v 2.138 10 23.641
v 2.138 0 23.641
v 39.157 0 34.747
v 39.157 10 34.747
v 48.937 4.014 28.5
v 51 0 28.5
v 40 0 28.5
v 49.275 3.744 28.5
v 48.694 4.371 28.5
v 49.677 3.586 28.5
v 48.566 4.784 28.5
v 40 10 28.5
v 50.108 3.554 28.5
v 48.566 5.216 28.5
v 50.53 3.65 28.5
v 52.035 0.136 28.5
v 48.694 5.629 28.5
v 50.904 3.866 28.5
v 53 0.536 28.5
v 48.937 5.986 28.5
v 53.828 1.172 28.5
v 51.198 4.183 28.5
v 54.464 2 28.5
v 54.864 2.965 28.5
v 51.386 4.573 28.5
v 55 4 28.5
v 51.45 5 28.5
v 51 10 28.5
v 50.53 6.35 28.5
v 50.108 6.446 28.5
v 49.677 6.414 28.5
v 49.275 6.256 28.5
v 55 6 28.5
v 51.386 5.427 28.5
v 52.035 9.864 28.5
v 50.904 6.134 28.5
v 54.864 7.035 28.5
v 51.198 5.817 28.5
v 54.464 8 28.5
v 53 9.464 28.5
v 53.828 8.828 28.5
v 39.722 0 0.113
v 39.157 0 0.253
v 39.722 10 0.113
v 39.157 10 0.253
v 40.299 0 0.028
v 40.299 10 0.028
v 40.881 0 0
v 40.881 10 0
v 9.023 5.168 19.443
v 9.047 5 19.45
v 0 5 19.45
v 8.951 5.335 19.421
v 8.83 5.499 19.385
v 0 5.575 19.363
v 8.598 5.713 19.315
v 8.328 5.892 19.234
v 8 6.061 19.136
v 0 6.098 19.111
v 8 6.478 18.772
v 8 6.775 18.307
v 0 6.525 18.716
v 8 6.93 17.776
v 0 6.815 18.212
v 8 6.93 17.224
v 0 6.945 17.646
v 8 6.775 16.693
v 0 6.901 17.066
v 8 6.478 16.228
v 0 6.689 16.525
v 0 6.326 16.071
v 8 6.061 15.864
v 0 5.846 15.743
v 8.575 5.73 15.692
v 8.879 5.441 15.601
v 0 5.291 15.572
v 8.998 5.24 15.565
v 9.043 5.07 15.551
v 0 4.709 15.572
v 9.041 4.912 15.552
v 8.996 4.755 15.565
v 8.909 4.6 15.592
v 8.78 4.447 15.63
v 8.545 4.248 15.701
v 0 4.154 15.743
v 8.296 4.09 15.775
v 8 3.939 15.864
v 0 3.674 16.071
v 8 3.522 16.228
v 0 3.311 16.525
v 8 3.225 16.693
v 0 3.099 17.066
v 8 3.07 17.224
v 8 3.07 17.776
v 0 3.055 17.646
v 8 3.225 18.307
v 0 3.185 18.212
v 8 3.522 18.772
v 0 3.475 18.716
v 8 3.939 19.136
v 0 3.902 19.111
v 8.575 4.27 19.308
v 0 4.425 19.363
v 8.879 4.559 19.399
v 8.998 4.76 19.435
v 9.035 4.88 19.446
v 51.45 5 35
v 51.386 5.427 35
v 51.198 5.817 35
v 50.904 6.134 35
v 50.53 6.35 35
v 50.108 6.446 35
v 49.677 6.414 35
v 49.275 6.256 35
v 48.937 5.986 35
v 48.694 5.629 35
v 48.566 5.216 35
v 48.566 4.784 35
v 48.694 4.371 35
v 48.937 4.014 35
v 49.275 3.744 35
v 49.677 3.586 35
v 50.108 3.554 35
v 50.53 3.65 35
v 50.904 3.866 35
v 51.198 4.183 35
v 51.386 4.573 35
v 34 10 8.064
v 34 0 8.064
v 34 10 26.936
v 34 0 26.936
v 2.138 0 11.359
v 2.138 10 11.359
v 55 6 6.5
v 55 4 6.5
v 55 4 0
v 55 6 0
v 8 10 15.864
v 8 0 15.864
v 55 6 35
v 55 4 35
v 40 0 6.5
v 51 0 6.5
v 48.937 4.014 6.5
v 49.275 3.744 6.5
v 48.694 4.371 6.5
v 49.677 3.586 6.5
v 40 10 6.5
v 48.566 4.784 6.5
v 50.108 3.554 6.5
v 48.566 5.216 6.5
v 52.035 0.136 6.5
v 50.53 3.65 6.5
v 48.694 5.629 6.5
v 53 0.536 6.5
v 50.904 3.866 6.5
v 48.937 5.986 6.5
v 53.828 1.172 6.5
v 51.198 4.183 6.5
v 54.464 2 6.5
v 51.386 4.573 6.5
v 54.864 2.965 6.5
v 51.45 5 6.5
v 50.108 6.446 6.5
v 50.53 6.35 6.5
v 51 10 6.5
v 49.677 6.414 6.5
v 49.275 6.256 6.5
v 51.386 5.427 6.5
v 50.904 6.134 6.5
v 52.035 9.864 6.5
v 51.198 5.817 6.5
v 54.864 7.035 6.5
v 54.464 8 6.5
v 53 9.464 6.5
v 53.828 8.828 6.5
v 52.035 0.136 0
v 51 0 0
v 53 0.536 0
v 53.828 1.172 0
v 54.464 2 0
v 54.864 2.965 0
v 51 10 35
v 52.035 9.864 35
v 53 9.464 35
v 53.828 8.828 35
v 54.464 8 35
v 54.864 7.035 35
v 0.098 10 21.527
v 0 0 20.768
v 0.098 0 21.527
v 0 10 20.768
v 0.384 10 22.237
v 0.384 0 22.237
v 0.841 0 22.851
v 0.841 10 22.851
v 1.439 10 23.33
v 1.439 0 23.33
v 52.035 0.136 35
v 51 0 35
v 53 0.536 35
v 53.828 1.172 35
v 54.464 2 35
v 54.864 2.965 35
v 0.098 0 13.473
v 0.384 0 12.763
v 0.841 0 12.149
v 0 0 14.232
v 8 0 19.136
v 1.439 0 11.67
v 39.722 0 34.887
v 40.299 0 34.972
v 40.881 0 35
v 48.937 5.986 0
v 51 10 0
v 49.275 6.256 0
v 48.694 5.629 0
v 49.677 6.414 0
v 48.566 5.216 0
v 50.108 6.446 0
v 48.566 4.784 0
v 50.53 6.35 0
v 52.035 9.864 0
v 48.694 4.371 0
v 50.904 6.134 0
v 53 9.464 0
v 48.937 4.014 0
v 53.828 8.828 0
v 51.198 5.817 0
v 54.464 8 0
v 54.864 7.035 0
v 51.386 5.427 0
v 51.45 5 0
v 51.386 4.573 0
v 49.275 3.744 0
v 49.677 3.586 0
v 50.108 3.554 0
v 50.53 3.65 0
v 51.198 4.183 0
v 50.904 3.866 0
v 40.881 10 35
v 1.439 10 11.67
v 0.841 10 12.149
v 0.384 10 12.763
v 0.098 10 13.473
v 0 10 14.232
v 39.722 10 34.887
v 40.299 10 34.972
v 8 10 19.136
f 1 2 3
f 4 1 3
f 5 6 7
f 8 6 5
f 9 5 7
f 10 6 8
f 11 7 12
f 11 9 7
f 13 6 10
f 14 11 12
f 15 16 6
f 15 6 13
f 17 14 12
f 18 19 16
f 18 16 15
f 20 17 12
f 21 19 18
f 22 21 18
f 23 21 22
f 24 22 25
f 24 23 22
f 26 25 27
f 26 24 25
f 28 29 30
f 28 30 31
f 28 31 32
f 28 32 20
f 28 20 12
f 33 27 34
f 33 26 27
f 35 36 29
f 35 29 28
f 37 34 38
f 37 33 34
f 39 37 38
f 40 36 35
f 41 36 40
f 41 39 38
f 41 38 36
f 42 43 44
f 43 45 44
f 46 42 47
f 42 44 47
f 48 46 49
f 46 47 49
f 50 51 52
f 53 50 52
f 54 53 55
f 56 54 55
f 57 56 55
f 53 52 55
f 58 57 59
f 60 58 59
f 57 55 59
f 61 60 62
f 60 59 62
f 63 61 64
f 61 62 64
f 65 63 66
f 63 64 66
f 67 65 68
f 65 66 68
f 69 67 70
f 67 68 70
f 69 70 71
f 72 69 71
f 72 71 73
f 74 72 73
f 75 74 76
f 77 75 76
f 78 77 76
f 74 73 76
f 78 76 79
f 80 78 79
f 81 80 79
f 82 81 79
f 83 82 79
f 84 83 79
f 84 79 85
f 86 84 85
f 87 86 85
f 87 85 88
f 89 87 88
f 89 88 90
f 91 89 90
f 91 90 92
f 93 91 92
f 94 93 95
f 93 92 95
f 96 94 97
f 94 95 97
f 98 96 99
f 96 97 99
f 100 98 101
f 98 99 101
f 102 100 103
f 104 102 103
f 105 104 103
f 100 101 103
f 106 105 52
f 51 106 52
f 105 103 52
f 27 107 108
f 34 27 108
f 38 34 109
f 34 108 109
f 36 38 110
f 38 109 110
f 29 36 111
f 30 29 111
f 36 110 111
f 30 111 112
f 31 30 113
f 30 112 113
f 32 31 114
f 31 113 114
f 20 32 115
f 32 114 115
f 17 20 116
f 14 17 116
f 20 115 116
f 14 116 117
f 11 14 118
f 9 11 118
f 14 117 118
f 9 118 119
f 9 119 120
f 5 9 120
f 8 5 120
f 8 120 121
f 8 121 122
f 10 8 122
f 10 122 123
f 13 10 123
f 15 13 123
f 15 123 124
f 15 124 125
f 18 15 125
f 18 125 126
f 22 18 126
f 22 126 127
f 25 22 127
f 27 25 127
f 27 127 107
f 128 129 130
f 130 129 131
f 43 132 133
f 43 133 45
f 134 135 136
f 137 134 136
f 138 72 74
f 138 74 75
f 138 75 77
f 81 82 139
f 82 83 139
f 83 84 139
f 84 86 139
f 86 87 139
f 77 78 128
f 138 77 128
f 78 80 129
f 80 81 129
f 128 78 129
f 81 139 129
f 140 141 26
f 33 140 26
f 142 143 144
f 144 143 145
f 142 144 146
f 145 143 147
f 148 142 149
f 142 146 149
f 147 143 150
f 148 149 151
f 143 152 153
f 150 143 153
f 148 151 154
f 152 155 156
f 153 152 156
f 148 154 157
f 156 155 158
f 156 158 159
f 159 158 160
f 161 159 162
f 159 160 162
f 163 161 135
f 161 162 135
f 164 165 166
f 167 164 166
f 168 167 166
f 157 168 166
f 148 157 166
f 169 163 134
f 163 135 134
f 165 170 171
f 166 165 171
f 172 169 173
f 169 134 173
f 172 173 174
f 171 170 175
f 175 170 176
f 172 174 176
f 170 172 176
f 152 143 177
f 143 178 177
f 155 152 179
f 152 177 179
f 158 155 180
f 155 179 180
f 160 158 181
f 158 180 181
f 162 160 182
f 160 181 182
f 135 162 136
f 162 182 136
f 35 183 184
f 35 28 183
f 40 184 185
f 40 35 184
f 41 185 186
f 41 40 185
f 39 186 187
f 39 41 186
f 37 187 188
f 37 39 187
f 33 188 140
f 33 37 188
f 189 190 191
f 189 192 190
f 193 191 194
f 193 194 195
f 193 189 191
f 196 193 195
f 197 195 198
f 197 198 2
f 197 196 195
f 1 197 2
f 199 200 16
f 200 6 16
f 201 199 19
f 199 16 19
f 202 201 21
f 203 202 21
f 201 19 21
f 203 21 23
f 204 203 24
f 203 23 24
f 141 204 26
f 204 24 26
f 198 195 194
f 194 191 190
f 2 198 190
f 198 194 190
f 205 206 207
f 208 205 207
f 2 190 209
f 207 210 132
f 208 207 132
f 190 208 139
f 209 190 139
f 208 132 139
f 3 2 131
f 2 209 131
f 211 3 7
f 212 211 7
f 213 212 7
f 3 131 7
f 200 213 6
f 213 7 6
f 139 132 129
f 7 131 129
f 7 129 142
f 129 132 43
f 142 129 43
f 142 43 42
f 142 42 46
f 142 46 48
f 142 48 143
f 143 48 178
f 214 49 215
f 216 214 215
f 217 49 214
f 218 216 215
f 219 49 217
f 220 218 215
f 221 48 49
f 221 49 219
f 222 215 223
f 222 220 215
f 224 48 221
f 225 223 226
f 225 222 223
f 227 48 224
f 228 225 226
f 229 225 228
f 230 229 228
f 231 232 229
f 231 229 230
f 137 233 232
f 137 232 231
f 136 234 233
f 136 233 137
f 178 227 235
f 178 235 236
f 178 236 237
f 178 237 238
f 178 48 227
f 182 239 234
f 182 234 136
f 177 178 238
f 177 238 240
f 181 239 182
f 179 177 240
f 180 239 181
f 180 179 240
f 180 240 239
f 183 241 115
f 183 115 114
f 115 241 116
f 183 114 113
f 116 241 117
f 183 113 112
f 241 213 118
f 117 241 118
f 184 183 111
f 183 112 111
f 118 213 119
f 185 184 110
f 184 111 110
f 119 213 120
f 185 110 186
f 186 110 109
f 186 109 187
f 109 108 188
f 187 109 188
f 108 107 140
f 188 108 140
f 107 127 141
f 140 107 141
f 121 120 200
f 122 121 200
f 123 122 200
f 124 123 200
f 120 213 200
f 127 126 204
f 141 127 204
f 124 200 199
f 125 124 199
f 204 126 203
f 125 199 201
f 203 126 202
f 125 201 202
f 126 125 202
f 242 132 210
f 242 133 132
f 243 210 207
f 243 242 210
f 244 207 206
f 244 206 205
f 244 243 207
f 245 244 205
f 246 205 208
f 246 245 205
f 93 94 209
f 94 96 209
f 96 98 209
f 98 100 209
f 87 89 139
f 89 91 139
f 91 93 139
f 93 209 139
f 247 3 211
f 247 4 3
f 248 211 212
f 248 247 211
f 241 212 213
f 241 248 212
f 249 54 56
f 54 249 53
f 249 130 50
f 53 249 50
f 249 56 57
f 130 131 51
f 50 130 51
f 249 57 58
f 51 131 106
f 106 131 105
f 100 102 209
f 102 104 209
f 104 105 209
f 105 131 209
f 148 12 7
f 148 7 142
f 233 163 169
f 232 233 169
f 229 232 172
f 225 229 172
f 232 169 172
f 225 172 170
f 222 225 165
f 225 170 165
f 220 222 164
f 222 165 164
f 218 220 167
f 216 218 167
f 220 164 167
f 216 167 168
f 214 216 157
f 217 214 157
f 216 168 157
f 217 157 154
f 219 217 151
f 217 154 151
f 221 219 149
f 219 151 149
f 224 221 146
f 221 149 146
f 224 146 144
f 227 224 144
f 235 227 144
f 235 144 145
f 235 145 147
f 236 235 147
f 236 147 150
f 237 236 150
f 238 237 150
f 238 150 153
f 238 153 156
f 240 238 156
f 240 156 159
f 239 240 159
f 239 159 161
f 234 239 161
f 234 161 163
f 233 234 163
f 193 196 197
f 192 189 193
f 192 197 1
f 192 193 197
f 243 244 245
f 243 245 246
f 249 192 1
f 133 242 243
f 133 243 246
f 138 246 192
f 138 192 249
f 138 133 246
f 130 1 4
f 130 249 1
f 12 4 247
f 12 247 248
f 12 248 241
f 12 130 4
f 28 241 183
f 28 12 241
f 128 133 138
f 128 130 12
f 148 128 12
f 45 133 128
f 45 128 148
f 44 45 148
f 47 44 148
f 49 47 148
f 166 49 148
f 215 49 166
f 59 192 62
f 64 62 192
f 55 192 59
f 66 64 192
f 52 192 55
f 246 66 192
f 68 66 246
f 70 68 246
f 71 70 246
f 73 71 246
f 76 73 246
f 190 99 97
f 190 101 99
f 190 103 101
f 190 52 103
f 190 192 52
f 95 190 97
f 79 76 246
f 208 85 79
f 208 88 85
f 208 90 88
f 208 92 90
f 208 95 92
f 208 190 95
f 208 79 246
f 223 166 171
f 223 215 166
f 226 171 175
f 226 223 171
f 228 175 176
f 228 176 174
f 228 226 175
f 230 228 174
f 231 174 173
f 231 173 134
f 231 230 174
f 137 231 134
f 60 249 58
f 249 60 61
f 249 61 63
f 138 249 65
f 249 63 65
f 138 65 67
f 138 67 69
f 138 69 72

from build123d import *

# Parameters (mm, degrees)
SKETCH1_W           = 55
SKETCH1_H           = 35
BOSS_EXTRUDE1_DEPTH = 10
CUT_EXTRUDE6_DEPTH  = 66.954529791
SKETCH12_R          = 1.45
CUT_EXTRUDE8_DEPTH  = 66.954529791
SKETCH13_R          = 1.95
CUT_EXTRUDE9_DEPTH  = 11
SKETCH2_W           = 22
SKETCH2_H           = 10
CUT_EXTRUDE10_DEPTH = 15
FILLET4_R           = 4
FILLET5_R           = 3
FILLET6_R           = 6
CUT_EXTRUDE11_DEPTH = 66.954529791


with BuildPart() as part:
    # Sketch1 → Boss-Extrude1 (new body)
    with BuildSketch(Plane(origin=(0, 0, 0), x_dir=(1, 0, 0), z_dir=(0, 1, 0))):
        with Locations((27.5, -17.5)):
            Rectangle(SKETCH1_W, SKETCH1_H)
    extrude(amount=BOSS_EXTRUDE1_DEPTH)

    # Sketch9 → Cut-Extrude6 (cut, through all)
    with BuildSketch(Plane(origin=(0, 0, 0), x_dir=(-1, 0, 0), z_dir=(0, -1, 0))):
        Polygon((0, -12), (-40, 0), (0, 0), align=None)
        Polygon((0, -23), (-40, -35), (0, -35), align=None)
    extrude(amount=-CUT_EXTRUDE6_DEPTH, mode=Mode.SUBTRACT)

    # Sketch12 → Cut-Extrude8 (cut, through all)
    with BuildSketch(Plane.XY.offset(35)):
        with Locations((50, 5)):
            Circle(SKETCH12_R)
    extrude(amount=-CUT_EXTRUDE8_DEPTH, mode=Mode.SUBTRACT)

    # Sketch13 → Cut-Extrude9 (cut)
    with BuildSketch(Plane.ZY):
        with Locations((17.5, 5)):
            Circle(SKETCH13_R)
    extrude(amount=-CUT_EXTRUDE9_DEPTH, mode=Mode.SUBTRACT)

    # Sketch2 → Cut-Extrude10 (cut)
    with BuildSketch(Plane(origin=(55, 0, 0), x_dir=(0, 0, -1), z_dir=(1, 0, 0))):
        with Locations((-17.5, 5)):
            Rectangle(SKETCH2_W, SKETCH2_H)
    extrude(amount=-CUT_EXTRUDE10_DEPTH, mode=Mode.SUBTRACT)

    # Fillet4
    fillet4_edges = [part.edges().sort_by_distance(p)[0] for p in [
        (55, 10, 31.75),
        (55, 0, 3.25),
        (55, 10, 3.25),
        (55, 0, 31.75),
    ]]
    fillet(fillet4_edges, radius=FILLET4_R)

    # Fillet5
    fillet5_edges = [part.edges().sort_by_distance(p)[0] for p in [
        (0, 5, 12),
        (0, 5, 23),
    ]]
    fillet(fillet5_edges, radius=FILLET5_R)

    # Fillet6
    fillet6_edges = [part.edges().sort_by_distance(p)[0] for p in [
        (40, 5, 0),
        (40, 5, 35),
    ]]
    fillet(fillet6_edges, radius=FILLET6_R)

    # Sketch15 → Cut-Extrude11 (cut, through all)
    with BuildSketch(Plane(origin=(0, 0, 0), x_dir=(-1, 0, 0), z_dir=(0, -1, 0))):
        Polygon((-34, -26.935816095), (-8, -19.135816095), (-8, -15.864183905), (-34, -8.064183905), align=None)
    extrude(amount=-CUT_EXTRUDE11_DEPTH, mode=Mode.SUBTRACT)


solid = part.part
